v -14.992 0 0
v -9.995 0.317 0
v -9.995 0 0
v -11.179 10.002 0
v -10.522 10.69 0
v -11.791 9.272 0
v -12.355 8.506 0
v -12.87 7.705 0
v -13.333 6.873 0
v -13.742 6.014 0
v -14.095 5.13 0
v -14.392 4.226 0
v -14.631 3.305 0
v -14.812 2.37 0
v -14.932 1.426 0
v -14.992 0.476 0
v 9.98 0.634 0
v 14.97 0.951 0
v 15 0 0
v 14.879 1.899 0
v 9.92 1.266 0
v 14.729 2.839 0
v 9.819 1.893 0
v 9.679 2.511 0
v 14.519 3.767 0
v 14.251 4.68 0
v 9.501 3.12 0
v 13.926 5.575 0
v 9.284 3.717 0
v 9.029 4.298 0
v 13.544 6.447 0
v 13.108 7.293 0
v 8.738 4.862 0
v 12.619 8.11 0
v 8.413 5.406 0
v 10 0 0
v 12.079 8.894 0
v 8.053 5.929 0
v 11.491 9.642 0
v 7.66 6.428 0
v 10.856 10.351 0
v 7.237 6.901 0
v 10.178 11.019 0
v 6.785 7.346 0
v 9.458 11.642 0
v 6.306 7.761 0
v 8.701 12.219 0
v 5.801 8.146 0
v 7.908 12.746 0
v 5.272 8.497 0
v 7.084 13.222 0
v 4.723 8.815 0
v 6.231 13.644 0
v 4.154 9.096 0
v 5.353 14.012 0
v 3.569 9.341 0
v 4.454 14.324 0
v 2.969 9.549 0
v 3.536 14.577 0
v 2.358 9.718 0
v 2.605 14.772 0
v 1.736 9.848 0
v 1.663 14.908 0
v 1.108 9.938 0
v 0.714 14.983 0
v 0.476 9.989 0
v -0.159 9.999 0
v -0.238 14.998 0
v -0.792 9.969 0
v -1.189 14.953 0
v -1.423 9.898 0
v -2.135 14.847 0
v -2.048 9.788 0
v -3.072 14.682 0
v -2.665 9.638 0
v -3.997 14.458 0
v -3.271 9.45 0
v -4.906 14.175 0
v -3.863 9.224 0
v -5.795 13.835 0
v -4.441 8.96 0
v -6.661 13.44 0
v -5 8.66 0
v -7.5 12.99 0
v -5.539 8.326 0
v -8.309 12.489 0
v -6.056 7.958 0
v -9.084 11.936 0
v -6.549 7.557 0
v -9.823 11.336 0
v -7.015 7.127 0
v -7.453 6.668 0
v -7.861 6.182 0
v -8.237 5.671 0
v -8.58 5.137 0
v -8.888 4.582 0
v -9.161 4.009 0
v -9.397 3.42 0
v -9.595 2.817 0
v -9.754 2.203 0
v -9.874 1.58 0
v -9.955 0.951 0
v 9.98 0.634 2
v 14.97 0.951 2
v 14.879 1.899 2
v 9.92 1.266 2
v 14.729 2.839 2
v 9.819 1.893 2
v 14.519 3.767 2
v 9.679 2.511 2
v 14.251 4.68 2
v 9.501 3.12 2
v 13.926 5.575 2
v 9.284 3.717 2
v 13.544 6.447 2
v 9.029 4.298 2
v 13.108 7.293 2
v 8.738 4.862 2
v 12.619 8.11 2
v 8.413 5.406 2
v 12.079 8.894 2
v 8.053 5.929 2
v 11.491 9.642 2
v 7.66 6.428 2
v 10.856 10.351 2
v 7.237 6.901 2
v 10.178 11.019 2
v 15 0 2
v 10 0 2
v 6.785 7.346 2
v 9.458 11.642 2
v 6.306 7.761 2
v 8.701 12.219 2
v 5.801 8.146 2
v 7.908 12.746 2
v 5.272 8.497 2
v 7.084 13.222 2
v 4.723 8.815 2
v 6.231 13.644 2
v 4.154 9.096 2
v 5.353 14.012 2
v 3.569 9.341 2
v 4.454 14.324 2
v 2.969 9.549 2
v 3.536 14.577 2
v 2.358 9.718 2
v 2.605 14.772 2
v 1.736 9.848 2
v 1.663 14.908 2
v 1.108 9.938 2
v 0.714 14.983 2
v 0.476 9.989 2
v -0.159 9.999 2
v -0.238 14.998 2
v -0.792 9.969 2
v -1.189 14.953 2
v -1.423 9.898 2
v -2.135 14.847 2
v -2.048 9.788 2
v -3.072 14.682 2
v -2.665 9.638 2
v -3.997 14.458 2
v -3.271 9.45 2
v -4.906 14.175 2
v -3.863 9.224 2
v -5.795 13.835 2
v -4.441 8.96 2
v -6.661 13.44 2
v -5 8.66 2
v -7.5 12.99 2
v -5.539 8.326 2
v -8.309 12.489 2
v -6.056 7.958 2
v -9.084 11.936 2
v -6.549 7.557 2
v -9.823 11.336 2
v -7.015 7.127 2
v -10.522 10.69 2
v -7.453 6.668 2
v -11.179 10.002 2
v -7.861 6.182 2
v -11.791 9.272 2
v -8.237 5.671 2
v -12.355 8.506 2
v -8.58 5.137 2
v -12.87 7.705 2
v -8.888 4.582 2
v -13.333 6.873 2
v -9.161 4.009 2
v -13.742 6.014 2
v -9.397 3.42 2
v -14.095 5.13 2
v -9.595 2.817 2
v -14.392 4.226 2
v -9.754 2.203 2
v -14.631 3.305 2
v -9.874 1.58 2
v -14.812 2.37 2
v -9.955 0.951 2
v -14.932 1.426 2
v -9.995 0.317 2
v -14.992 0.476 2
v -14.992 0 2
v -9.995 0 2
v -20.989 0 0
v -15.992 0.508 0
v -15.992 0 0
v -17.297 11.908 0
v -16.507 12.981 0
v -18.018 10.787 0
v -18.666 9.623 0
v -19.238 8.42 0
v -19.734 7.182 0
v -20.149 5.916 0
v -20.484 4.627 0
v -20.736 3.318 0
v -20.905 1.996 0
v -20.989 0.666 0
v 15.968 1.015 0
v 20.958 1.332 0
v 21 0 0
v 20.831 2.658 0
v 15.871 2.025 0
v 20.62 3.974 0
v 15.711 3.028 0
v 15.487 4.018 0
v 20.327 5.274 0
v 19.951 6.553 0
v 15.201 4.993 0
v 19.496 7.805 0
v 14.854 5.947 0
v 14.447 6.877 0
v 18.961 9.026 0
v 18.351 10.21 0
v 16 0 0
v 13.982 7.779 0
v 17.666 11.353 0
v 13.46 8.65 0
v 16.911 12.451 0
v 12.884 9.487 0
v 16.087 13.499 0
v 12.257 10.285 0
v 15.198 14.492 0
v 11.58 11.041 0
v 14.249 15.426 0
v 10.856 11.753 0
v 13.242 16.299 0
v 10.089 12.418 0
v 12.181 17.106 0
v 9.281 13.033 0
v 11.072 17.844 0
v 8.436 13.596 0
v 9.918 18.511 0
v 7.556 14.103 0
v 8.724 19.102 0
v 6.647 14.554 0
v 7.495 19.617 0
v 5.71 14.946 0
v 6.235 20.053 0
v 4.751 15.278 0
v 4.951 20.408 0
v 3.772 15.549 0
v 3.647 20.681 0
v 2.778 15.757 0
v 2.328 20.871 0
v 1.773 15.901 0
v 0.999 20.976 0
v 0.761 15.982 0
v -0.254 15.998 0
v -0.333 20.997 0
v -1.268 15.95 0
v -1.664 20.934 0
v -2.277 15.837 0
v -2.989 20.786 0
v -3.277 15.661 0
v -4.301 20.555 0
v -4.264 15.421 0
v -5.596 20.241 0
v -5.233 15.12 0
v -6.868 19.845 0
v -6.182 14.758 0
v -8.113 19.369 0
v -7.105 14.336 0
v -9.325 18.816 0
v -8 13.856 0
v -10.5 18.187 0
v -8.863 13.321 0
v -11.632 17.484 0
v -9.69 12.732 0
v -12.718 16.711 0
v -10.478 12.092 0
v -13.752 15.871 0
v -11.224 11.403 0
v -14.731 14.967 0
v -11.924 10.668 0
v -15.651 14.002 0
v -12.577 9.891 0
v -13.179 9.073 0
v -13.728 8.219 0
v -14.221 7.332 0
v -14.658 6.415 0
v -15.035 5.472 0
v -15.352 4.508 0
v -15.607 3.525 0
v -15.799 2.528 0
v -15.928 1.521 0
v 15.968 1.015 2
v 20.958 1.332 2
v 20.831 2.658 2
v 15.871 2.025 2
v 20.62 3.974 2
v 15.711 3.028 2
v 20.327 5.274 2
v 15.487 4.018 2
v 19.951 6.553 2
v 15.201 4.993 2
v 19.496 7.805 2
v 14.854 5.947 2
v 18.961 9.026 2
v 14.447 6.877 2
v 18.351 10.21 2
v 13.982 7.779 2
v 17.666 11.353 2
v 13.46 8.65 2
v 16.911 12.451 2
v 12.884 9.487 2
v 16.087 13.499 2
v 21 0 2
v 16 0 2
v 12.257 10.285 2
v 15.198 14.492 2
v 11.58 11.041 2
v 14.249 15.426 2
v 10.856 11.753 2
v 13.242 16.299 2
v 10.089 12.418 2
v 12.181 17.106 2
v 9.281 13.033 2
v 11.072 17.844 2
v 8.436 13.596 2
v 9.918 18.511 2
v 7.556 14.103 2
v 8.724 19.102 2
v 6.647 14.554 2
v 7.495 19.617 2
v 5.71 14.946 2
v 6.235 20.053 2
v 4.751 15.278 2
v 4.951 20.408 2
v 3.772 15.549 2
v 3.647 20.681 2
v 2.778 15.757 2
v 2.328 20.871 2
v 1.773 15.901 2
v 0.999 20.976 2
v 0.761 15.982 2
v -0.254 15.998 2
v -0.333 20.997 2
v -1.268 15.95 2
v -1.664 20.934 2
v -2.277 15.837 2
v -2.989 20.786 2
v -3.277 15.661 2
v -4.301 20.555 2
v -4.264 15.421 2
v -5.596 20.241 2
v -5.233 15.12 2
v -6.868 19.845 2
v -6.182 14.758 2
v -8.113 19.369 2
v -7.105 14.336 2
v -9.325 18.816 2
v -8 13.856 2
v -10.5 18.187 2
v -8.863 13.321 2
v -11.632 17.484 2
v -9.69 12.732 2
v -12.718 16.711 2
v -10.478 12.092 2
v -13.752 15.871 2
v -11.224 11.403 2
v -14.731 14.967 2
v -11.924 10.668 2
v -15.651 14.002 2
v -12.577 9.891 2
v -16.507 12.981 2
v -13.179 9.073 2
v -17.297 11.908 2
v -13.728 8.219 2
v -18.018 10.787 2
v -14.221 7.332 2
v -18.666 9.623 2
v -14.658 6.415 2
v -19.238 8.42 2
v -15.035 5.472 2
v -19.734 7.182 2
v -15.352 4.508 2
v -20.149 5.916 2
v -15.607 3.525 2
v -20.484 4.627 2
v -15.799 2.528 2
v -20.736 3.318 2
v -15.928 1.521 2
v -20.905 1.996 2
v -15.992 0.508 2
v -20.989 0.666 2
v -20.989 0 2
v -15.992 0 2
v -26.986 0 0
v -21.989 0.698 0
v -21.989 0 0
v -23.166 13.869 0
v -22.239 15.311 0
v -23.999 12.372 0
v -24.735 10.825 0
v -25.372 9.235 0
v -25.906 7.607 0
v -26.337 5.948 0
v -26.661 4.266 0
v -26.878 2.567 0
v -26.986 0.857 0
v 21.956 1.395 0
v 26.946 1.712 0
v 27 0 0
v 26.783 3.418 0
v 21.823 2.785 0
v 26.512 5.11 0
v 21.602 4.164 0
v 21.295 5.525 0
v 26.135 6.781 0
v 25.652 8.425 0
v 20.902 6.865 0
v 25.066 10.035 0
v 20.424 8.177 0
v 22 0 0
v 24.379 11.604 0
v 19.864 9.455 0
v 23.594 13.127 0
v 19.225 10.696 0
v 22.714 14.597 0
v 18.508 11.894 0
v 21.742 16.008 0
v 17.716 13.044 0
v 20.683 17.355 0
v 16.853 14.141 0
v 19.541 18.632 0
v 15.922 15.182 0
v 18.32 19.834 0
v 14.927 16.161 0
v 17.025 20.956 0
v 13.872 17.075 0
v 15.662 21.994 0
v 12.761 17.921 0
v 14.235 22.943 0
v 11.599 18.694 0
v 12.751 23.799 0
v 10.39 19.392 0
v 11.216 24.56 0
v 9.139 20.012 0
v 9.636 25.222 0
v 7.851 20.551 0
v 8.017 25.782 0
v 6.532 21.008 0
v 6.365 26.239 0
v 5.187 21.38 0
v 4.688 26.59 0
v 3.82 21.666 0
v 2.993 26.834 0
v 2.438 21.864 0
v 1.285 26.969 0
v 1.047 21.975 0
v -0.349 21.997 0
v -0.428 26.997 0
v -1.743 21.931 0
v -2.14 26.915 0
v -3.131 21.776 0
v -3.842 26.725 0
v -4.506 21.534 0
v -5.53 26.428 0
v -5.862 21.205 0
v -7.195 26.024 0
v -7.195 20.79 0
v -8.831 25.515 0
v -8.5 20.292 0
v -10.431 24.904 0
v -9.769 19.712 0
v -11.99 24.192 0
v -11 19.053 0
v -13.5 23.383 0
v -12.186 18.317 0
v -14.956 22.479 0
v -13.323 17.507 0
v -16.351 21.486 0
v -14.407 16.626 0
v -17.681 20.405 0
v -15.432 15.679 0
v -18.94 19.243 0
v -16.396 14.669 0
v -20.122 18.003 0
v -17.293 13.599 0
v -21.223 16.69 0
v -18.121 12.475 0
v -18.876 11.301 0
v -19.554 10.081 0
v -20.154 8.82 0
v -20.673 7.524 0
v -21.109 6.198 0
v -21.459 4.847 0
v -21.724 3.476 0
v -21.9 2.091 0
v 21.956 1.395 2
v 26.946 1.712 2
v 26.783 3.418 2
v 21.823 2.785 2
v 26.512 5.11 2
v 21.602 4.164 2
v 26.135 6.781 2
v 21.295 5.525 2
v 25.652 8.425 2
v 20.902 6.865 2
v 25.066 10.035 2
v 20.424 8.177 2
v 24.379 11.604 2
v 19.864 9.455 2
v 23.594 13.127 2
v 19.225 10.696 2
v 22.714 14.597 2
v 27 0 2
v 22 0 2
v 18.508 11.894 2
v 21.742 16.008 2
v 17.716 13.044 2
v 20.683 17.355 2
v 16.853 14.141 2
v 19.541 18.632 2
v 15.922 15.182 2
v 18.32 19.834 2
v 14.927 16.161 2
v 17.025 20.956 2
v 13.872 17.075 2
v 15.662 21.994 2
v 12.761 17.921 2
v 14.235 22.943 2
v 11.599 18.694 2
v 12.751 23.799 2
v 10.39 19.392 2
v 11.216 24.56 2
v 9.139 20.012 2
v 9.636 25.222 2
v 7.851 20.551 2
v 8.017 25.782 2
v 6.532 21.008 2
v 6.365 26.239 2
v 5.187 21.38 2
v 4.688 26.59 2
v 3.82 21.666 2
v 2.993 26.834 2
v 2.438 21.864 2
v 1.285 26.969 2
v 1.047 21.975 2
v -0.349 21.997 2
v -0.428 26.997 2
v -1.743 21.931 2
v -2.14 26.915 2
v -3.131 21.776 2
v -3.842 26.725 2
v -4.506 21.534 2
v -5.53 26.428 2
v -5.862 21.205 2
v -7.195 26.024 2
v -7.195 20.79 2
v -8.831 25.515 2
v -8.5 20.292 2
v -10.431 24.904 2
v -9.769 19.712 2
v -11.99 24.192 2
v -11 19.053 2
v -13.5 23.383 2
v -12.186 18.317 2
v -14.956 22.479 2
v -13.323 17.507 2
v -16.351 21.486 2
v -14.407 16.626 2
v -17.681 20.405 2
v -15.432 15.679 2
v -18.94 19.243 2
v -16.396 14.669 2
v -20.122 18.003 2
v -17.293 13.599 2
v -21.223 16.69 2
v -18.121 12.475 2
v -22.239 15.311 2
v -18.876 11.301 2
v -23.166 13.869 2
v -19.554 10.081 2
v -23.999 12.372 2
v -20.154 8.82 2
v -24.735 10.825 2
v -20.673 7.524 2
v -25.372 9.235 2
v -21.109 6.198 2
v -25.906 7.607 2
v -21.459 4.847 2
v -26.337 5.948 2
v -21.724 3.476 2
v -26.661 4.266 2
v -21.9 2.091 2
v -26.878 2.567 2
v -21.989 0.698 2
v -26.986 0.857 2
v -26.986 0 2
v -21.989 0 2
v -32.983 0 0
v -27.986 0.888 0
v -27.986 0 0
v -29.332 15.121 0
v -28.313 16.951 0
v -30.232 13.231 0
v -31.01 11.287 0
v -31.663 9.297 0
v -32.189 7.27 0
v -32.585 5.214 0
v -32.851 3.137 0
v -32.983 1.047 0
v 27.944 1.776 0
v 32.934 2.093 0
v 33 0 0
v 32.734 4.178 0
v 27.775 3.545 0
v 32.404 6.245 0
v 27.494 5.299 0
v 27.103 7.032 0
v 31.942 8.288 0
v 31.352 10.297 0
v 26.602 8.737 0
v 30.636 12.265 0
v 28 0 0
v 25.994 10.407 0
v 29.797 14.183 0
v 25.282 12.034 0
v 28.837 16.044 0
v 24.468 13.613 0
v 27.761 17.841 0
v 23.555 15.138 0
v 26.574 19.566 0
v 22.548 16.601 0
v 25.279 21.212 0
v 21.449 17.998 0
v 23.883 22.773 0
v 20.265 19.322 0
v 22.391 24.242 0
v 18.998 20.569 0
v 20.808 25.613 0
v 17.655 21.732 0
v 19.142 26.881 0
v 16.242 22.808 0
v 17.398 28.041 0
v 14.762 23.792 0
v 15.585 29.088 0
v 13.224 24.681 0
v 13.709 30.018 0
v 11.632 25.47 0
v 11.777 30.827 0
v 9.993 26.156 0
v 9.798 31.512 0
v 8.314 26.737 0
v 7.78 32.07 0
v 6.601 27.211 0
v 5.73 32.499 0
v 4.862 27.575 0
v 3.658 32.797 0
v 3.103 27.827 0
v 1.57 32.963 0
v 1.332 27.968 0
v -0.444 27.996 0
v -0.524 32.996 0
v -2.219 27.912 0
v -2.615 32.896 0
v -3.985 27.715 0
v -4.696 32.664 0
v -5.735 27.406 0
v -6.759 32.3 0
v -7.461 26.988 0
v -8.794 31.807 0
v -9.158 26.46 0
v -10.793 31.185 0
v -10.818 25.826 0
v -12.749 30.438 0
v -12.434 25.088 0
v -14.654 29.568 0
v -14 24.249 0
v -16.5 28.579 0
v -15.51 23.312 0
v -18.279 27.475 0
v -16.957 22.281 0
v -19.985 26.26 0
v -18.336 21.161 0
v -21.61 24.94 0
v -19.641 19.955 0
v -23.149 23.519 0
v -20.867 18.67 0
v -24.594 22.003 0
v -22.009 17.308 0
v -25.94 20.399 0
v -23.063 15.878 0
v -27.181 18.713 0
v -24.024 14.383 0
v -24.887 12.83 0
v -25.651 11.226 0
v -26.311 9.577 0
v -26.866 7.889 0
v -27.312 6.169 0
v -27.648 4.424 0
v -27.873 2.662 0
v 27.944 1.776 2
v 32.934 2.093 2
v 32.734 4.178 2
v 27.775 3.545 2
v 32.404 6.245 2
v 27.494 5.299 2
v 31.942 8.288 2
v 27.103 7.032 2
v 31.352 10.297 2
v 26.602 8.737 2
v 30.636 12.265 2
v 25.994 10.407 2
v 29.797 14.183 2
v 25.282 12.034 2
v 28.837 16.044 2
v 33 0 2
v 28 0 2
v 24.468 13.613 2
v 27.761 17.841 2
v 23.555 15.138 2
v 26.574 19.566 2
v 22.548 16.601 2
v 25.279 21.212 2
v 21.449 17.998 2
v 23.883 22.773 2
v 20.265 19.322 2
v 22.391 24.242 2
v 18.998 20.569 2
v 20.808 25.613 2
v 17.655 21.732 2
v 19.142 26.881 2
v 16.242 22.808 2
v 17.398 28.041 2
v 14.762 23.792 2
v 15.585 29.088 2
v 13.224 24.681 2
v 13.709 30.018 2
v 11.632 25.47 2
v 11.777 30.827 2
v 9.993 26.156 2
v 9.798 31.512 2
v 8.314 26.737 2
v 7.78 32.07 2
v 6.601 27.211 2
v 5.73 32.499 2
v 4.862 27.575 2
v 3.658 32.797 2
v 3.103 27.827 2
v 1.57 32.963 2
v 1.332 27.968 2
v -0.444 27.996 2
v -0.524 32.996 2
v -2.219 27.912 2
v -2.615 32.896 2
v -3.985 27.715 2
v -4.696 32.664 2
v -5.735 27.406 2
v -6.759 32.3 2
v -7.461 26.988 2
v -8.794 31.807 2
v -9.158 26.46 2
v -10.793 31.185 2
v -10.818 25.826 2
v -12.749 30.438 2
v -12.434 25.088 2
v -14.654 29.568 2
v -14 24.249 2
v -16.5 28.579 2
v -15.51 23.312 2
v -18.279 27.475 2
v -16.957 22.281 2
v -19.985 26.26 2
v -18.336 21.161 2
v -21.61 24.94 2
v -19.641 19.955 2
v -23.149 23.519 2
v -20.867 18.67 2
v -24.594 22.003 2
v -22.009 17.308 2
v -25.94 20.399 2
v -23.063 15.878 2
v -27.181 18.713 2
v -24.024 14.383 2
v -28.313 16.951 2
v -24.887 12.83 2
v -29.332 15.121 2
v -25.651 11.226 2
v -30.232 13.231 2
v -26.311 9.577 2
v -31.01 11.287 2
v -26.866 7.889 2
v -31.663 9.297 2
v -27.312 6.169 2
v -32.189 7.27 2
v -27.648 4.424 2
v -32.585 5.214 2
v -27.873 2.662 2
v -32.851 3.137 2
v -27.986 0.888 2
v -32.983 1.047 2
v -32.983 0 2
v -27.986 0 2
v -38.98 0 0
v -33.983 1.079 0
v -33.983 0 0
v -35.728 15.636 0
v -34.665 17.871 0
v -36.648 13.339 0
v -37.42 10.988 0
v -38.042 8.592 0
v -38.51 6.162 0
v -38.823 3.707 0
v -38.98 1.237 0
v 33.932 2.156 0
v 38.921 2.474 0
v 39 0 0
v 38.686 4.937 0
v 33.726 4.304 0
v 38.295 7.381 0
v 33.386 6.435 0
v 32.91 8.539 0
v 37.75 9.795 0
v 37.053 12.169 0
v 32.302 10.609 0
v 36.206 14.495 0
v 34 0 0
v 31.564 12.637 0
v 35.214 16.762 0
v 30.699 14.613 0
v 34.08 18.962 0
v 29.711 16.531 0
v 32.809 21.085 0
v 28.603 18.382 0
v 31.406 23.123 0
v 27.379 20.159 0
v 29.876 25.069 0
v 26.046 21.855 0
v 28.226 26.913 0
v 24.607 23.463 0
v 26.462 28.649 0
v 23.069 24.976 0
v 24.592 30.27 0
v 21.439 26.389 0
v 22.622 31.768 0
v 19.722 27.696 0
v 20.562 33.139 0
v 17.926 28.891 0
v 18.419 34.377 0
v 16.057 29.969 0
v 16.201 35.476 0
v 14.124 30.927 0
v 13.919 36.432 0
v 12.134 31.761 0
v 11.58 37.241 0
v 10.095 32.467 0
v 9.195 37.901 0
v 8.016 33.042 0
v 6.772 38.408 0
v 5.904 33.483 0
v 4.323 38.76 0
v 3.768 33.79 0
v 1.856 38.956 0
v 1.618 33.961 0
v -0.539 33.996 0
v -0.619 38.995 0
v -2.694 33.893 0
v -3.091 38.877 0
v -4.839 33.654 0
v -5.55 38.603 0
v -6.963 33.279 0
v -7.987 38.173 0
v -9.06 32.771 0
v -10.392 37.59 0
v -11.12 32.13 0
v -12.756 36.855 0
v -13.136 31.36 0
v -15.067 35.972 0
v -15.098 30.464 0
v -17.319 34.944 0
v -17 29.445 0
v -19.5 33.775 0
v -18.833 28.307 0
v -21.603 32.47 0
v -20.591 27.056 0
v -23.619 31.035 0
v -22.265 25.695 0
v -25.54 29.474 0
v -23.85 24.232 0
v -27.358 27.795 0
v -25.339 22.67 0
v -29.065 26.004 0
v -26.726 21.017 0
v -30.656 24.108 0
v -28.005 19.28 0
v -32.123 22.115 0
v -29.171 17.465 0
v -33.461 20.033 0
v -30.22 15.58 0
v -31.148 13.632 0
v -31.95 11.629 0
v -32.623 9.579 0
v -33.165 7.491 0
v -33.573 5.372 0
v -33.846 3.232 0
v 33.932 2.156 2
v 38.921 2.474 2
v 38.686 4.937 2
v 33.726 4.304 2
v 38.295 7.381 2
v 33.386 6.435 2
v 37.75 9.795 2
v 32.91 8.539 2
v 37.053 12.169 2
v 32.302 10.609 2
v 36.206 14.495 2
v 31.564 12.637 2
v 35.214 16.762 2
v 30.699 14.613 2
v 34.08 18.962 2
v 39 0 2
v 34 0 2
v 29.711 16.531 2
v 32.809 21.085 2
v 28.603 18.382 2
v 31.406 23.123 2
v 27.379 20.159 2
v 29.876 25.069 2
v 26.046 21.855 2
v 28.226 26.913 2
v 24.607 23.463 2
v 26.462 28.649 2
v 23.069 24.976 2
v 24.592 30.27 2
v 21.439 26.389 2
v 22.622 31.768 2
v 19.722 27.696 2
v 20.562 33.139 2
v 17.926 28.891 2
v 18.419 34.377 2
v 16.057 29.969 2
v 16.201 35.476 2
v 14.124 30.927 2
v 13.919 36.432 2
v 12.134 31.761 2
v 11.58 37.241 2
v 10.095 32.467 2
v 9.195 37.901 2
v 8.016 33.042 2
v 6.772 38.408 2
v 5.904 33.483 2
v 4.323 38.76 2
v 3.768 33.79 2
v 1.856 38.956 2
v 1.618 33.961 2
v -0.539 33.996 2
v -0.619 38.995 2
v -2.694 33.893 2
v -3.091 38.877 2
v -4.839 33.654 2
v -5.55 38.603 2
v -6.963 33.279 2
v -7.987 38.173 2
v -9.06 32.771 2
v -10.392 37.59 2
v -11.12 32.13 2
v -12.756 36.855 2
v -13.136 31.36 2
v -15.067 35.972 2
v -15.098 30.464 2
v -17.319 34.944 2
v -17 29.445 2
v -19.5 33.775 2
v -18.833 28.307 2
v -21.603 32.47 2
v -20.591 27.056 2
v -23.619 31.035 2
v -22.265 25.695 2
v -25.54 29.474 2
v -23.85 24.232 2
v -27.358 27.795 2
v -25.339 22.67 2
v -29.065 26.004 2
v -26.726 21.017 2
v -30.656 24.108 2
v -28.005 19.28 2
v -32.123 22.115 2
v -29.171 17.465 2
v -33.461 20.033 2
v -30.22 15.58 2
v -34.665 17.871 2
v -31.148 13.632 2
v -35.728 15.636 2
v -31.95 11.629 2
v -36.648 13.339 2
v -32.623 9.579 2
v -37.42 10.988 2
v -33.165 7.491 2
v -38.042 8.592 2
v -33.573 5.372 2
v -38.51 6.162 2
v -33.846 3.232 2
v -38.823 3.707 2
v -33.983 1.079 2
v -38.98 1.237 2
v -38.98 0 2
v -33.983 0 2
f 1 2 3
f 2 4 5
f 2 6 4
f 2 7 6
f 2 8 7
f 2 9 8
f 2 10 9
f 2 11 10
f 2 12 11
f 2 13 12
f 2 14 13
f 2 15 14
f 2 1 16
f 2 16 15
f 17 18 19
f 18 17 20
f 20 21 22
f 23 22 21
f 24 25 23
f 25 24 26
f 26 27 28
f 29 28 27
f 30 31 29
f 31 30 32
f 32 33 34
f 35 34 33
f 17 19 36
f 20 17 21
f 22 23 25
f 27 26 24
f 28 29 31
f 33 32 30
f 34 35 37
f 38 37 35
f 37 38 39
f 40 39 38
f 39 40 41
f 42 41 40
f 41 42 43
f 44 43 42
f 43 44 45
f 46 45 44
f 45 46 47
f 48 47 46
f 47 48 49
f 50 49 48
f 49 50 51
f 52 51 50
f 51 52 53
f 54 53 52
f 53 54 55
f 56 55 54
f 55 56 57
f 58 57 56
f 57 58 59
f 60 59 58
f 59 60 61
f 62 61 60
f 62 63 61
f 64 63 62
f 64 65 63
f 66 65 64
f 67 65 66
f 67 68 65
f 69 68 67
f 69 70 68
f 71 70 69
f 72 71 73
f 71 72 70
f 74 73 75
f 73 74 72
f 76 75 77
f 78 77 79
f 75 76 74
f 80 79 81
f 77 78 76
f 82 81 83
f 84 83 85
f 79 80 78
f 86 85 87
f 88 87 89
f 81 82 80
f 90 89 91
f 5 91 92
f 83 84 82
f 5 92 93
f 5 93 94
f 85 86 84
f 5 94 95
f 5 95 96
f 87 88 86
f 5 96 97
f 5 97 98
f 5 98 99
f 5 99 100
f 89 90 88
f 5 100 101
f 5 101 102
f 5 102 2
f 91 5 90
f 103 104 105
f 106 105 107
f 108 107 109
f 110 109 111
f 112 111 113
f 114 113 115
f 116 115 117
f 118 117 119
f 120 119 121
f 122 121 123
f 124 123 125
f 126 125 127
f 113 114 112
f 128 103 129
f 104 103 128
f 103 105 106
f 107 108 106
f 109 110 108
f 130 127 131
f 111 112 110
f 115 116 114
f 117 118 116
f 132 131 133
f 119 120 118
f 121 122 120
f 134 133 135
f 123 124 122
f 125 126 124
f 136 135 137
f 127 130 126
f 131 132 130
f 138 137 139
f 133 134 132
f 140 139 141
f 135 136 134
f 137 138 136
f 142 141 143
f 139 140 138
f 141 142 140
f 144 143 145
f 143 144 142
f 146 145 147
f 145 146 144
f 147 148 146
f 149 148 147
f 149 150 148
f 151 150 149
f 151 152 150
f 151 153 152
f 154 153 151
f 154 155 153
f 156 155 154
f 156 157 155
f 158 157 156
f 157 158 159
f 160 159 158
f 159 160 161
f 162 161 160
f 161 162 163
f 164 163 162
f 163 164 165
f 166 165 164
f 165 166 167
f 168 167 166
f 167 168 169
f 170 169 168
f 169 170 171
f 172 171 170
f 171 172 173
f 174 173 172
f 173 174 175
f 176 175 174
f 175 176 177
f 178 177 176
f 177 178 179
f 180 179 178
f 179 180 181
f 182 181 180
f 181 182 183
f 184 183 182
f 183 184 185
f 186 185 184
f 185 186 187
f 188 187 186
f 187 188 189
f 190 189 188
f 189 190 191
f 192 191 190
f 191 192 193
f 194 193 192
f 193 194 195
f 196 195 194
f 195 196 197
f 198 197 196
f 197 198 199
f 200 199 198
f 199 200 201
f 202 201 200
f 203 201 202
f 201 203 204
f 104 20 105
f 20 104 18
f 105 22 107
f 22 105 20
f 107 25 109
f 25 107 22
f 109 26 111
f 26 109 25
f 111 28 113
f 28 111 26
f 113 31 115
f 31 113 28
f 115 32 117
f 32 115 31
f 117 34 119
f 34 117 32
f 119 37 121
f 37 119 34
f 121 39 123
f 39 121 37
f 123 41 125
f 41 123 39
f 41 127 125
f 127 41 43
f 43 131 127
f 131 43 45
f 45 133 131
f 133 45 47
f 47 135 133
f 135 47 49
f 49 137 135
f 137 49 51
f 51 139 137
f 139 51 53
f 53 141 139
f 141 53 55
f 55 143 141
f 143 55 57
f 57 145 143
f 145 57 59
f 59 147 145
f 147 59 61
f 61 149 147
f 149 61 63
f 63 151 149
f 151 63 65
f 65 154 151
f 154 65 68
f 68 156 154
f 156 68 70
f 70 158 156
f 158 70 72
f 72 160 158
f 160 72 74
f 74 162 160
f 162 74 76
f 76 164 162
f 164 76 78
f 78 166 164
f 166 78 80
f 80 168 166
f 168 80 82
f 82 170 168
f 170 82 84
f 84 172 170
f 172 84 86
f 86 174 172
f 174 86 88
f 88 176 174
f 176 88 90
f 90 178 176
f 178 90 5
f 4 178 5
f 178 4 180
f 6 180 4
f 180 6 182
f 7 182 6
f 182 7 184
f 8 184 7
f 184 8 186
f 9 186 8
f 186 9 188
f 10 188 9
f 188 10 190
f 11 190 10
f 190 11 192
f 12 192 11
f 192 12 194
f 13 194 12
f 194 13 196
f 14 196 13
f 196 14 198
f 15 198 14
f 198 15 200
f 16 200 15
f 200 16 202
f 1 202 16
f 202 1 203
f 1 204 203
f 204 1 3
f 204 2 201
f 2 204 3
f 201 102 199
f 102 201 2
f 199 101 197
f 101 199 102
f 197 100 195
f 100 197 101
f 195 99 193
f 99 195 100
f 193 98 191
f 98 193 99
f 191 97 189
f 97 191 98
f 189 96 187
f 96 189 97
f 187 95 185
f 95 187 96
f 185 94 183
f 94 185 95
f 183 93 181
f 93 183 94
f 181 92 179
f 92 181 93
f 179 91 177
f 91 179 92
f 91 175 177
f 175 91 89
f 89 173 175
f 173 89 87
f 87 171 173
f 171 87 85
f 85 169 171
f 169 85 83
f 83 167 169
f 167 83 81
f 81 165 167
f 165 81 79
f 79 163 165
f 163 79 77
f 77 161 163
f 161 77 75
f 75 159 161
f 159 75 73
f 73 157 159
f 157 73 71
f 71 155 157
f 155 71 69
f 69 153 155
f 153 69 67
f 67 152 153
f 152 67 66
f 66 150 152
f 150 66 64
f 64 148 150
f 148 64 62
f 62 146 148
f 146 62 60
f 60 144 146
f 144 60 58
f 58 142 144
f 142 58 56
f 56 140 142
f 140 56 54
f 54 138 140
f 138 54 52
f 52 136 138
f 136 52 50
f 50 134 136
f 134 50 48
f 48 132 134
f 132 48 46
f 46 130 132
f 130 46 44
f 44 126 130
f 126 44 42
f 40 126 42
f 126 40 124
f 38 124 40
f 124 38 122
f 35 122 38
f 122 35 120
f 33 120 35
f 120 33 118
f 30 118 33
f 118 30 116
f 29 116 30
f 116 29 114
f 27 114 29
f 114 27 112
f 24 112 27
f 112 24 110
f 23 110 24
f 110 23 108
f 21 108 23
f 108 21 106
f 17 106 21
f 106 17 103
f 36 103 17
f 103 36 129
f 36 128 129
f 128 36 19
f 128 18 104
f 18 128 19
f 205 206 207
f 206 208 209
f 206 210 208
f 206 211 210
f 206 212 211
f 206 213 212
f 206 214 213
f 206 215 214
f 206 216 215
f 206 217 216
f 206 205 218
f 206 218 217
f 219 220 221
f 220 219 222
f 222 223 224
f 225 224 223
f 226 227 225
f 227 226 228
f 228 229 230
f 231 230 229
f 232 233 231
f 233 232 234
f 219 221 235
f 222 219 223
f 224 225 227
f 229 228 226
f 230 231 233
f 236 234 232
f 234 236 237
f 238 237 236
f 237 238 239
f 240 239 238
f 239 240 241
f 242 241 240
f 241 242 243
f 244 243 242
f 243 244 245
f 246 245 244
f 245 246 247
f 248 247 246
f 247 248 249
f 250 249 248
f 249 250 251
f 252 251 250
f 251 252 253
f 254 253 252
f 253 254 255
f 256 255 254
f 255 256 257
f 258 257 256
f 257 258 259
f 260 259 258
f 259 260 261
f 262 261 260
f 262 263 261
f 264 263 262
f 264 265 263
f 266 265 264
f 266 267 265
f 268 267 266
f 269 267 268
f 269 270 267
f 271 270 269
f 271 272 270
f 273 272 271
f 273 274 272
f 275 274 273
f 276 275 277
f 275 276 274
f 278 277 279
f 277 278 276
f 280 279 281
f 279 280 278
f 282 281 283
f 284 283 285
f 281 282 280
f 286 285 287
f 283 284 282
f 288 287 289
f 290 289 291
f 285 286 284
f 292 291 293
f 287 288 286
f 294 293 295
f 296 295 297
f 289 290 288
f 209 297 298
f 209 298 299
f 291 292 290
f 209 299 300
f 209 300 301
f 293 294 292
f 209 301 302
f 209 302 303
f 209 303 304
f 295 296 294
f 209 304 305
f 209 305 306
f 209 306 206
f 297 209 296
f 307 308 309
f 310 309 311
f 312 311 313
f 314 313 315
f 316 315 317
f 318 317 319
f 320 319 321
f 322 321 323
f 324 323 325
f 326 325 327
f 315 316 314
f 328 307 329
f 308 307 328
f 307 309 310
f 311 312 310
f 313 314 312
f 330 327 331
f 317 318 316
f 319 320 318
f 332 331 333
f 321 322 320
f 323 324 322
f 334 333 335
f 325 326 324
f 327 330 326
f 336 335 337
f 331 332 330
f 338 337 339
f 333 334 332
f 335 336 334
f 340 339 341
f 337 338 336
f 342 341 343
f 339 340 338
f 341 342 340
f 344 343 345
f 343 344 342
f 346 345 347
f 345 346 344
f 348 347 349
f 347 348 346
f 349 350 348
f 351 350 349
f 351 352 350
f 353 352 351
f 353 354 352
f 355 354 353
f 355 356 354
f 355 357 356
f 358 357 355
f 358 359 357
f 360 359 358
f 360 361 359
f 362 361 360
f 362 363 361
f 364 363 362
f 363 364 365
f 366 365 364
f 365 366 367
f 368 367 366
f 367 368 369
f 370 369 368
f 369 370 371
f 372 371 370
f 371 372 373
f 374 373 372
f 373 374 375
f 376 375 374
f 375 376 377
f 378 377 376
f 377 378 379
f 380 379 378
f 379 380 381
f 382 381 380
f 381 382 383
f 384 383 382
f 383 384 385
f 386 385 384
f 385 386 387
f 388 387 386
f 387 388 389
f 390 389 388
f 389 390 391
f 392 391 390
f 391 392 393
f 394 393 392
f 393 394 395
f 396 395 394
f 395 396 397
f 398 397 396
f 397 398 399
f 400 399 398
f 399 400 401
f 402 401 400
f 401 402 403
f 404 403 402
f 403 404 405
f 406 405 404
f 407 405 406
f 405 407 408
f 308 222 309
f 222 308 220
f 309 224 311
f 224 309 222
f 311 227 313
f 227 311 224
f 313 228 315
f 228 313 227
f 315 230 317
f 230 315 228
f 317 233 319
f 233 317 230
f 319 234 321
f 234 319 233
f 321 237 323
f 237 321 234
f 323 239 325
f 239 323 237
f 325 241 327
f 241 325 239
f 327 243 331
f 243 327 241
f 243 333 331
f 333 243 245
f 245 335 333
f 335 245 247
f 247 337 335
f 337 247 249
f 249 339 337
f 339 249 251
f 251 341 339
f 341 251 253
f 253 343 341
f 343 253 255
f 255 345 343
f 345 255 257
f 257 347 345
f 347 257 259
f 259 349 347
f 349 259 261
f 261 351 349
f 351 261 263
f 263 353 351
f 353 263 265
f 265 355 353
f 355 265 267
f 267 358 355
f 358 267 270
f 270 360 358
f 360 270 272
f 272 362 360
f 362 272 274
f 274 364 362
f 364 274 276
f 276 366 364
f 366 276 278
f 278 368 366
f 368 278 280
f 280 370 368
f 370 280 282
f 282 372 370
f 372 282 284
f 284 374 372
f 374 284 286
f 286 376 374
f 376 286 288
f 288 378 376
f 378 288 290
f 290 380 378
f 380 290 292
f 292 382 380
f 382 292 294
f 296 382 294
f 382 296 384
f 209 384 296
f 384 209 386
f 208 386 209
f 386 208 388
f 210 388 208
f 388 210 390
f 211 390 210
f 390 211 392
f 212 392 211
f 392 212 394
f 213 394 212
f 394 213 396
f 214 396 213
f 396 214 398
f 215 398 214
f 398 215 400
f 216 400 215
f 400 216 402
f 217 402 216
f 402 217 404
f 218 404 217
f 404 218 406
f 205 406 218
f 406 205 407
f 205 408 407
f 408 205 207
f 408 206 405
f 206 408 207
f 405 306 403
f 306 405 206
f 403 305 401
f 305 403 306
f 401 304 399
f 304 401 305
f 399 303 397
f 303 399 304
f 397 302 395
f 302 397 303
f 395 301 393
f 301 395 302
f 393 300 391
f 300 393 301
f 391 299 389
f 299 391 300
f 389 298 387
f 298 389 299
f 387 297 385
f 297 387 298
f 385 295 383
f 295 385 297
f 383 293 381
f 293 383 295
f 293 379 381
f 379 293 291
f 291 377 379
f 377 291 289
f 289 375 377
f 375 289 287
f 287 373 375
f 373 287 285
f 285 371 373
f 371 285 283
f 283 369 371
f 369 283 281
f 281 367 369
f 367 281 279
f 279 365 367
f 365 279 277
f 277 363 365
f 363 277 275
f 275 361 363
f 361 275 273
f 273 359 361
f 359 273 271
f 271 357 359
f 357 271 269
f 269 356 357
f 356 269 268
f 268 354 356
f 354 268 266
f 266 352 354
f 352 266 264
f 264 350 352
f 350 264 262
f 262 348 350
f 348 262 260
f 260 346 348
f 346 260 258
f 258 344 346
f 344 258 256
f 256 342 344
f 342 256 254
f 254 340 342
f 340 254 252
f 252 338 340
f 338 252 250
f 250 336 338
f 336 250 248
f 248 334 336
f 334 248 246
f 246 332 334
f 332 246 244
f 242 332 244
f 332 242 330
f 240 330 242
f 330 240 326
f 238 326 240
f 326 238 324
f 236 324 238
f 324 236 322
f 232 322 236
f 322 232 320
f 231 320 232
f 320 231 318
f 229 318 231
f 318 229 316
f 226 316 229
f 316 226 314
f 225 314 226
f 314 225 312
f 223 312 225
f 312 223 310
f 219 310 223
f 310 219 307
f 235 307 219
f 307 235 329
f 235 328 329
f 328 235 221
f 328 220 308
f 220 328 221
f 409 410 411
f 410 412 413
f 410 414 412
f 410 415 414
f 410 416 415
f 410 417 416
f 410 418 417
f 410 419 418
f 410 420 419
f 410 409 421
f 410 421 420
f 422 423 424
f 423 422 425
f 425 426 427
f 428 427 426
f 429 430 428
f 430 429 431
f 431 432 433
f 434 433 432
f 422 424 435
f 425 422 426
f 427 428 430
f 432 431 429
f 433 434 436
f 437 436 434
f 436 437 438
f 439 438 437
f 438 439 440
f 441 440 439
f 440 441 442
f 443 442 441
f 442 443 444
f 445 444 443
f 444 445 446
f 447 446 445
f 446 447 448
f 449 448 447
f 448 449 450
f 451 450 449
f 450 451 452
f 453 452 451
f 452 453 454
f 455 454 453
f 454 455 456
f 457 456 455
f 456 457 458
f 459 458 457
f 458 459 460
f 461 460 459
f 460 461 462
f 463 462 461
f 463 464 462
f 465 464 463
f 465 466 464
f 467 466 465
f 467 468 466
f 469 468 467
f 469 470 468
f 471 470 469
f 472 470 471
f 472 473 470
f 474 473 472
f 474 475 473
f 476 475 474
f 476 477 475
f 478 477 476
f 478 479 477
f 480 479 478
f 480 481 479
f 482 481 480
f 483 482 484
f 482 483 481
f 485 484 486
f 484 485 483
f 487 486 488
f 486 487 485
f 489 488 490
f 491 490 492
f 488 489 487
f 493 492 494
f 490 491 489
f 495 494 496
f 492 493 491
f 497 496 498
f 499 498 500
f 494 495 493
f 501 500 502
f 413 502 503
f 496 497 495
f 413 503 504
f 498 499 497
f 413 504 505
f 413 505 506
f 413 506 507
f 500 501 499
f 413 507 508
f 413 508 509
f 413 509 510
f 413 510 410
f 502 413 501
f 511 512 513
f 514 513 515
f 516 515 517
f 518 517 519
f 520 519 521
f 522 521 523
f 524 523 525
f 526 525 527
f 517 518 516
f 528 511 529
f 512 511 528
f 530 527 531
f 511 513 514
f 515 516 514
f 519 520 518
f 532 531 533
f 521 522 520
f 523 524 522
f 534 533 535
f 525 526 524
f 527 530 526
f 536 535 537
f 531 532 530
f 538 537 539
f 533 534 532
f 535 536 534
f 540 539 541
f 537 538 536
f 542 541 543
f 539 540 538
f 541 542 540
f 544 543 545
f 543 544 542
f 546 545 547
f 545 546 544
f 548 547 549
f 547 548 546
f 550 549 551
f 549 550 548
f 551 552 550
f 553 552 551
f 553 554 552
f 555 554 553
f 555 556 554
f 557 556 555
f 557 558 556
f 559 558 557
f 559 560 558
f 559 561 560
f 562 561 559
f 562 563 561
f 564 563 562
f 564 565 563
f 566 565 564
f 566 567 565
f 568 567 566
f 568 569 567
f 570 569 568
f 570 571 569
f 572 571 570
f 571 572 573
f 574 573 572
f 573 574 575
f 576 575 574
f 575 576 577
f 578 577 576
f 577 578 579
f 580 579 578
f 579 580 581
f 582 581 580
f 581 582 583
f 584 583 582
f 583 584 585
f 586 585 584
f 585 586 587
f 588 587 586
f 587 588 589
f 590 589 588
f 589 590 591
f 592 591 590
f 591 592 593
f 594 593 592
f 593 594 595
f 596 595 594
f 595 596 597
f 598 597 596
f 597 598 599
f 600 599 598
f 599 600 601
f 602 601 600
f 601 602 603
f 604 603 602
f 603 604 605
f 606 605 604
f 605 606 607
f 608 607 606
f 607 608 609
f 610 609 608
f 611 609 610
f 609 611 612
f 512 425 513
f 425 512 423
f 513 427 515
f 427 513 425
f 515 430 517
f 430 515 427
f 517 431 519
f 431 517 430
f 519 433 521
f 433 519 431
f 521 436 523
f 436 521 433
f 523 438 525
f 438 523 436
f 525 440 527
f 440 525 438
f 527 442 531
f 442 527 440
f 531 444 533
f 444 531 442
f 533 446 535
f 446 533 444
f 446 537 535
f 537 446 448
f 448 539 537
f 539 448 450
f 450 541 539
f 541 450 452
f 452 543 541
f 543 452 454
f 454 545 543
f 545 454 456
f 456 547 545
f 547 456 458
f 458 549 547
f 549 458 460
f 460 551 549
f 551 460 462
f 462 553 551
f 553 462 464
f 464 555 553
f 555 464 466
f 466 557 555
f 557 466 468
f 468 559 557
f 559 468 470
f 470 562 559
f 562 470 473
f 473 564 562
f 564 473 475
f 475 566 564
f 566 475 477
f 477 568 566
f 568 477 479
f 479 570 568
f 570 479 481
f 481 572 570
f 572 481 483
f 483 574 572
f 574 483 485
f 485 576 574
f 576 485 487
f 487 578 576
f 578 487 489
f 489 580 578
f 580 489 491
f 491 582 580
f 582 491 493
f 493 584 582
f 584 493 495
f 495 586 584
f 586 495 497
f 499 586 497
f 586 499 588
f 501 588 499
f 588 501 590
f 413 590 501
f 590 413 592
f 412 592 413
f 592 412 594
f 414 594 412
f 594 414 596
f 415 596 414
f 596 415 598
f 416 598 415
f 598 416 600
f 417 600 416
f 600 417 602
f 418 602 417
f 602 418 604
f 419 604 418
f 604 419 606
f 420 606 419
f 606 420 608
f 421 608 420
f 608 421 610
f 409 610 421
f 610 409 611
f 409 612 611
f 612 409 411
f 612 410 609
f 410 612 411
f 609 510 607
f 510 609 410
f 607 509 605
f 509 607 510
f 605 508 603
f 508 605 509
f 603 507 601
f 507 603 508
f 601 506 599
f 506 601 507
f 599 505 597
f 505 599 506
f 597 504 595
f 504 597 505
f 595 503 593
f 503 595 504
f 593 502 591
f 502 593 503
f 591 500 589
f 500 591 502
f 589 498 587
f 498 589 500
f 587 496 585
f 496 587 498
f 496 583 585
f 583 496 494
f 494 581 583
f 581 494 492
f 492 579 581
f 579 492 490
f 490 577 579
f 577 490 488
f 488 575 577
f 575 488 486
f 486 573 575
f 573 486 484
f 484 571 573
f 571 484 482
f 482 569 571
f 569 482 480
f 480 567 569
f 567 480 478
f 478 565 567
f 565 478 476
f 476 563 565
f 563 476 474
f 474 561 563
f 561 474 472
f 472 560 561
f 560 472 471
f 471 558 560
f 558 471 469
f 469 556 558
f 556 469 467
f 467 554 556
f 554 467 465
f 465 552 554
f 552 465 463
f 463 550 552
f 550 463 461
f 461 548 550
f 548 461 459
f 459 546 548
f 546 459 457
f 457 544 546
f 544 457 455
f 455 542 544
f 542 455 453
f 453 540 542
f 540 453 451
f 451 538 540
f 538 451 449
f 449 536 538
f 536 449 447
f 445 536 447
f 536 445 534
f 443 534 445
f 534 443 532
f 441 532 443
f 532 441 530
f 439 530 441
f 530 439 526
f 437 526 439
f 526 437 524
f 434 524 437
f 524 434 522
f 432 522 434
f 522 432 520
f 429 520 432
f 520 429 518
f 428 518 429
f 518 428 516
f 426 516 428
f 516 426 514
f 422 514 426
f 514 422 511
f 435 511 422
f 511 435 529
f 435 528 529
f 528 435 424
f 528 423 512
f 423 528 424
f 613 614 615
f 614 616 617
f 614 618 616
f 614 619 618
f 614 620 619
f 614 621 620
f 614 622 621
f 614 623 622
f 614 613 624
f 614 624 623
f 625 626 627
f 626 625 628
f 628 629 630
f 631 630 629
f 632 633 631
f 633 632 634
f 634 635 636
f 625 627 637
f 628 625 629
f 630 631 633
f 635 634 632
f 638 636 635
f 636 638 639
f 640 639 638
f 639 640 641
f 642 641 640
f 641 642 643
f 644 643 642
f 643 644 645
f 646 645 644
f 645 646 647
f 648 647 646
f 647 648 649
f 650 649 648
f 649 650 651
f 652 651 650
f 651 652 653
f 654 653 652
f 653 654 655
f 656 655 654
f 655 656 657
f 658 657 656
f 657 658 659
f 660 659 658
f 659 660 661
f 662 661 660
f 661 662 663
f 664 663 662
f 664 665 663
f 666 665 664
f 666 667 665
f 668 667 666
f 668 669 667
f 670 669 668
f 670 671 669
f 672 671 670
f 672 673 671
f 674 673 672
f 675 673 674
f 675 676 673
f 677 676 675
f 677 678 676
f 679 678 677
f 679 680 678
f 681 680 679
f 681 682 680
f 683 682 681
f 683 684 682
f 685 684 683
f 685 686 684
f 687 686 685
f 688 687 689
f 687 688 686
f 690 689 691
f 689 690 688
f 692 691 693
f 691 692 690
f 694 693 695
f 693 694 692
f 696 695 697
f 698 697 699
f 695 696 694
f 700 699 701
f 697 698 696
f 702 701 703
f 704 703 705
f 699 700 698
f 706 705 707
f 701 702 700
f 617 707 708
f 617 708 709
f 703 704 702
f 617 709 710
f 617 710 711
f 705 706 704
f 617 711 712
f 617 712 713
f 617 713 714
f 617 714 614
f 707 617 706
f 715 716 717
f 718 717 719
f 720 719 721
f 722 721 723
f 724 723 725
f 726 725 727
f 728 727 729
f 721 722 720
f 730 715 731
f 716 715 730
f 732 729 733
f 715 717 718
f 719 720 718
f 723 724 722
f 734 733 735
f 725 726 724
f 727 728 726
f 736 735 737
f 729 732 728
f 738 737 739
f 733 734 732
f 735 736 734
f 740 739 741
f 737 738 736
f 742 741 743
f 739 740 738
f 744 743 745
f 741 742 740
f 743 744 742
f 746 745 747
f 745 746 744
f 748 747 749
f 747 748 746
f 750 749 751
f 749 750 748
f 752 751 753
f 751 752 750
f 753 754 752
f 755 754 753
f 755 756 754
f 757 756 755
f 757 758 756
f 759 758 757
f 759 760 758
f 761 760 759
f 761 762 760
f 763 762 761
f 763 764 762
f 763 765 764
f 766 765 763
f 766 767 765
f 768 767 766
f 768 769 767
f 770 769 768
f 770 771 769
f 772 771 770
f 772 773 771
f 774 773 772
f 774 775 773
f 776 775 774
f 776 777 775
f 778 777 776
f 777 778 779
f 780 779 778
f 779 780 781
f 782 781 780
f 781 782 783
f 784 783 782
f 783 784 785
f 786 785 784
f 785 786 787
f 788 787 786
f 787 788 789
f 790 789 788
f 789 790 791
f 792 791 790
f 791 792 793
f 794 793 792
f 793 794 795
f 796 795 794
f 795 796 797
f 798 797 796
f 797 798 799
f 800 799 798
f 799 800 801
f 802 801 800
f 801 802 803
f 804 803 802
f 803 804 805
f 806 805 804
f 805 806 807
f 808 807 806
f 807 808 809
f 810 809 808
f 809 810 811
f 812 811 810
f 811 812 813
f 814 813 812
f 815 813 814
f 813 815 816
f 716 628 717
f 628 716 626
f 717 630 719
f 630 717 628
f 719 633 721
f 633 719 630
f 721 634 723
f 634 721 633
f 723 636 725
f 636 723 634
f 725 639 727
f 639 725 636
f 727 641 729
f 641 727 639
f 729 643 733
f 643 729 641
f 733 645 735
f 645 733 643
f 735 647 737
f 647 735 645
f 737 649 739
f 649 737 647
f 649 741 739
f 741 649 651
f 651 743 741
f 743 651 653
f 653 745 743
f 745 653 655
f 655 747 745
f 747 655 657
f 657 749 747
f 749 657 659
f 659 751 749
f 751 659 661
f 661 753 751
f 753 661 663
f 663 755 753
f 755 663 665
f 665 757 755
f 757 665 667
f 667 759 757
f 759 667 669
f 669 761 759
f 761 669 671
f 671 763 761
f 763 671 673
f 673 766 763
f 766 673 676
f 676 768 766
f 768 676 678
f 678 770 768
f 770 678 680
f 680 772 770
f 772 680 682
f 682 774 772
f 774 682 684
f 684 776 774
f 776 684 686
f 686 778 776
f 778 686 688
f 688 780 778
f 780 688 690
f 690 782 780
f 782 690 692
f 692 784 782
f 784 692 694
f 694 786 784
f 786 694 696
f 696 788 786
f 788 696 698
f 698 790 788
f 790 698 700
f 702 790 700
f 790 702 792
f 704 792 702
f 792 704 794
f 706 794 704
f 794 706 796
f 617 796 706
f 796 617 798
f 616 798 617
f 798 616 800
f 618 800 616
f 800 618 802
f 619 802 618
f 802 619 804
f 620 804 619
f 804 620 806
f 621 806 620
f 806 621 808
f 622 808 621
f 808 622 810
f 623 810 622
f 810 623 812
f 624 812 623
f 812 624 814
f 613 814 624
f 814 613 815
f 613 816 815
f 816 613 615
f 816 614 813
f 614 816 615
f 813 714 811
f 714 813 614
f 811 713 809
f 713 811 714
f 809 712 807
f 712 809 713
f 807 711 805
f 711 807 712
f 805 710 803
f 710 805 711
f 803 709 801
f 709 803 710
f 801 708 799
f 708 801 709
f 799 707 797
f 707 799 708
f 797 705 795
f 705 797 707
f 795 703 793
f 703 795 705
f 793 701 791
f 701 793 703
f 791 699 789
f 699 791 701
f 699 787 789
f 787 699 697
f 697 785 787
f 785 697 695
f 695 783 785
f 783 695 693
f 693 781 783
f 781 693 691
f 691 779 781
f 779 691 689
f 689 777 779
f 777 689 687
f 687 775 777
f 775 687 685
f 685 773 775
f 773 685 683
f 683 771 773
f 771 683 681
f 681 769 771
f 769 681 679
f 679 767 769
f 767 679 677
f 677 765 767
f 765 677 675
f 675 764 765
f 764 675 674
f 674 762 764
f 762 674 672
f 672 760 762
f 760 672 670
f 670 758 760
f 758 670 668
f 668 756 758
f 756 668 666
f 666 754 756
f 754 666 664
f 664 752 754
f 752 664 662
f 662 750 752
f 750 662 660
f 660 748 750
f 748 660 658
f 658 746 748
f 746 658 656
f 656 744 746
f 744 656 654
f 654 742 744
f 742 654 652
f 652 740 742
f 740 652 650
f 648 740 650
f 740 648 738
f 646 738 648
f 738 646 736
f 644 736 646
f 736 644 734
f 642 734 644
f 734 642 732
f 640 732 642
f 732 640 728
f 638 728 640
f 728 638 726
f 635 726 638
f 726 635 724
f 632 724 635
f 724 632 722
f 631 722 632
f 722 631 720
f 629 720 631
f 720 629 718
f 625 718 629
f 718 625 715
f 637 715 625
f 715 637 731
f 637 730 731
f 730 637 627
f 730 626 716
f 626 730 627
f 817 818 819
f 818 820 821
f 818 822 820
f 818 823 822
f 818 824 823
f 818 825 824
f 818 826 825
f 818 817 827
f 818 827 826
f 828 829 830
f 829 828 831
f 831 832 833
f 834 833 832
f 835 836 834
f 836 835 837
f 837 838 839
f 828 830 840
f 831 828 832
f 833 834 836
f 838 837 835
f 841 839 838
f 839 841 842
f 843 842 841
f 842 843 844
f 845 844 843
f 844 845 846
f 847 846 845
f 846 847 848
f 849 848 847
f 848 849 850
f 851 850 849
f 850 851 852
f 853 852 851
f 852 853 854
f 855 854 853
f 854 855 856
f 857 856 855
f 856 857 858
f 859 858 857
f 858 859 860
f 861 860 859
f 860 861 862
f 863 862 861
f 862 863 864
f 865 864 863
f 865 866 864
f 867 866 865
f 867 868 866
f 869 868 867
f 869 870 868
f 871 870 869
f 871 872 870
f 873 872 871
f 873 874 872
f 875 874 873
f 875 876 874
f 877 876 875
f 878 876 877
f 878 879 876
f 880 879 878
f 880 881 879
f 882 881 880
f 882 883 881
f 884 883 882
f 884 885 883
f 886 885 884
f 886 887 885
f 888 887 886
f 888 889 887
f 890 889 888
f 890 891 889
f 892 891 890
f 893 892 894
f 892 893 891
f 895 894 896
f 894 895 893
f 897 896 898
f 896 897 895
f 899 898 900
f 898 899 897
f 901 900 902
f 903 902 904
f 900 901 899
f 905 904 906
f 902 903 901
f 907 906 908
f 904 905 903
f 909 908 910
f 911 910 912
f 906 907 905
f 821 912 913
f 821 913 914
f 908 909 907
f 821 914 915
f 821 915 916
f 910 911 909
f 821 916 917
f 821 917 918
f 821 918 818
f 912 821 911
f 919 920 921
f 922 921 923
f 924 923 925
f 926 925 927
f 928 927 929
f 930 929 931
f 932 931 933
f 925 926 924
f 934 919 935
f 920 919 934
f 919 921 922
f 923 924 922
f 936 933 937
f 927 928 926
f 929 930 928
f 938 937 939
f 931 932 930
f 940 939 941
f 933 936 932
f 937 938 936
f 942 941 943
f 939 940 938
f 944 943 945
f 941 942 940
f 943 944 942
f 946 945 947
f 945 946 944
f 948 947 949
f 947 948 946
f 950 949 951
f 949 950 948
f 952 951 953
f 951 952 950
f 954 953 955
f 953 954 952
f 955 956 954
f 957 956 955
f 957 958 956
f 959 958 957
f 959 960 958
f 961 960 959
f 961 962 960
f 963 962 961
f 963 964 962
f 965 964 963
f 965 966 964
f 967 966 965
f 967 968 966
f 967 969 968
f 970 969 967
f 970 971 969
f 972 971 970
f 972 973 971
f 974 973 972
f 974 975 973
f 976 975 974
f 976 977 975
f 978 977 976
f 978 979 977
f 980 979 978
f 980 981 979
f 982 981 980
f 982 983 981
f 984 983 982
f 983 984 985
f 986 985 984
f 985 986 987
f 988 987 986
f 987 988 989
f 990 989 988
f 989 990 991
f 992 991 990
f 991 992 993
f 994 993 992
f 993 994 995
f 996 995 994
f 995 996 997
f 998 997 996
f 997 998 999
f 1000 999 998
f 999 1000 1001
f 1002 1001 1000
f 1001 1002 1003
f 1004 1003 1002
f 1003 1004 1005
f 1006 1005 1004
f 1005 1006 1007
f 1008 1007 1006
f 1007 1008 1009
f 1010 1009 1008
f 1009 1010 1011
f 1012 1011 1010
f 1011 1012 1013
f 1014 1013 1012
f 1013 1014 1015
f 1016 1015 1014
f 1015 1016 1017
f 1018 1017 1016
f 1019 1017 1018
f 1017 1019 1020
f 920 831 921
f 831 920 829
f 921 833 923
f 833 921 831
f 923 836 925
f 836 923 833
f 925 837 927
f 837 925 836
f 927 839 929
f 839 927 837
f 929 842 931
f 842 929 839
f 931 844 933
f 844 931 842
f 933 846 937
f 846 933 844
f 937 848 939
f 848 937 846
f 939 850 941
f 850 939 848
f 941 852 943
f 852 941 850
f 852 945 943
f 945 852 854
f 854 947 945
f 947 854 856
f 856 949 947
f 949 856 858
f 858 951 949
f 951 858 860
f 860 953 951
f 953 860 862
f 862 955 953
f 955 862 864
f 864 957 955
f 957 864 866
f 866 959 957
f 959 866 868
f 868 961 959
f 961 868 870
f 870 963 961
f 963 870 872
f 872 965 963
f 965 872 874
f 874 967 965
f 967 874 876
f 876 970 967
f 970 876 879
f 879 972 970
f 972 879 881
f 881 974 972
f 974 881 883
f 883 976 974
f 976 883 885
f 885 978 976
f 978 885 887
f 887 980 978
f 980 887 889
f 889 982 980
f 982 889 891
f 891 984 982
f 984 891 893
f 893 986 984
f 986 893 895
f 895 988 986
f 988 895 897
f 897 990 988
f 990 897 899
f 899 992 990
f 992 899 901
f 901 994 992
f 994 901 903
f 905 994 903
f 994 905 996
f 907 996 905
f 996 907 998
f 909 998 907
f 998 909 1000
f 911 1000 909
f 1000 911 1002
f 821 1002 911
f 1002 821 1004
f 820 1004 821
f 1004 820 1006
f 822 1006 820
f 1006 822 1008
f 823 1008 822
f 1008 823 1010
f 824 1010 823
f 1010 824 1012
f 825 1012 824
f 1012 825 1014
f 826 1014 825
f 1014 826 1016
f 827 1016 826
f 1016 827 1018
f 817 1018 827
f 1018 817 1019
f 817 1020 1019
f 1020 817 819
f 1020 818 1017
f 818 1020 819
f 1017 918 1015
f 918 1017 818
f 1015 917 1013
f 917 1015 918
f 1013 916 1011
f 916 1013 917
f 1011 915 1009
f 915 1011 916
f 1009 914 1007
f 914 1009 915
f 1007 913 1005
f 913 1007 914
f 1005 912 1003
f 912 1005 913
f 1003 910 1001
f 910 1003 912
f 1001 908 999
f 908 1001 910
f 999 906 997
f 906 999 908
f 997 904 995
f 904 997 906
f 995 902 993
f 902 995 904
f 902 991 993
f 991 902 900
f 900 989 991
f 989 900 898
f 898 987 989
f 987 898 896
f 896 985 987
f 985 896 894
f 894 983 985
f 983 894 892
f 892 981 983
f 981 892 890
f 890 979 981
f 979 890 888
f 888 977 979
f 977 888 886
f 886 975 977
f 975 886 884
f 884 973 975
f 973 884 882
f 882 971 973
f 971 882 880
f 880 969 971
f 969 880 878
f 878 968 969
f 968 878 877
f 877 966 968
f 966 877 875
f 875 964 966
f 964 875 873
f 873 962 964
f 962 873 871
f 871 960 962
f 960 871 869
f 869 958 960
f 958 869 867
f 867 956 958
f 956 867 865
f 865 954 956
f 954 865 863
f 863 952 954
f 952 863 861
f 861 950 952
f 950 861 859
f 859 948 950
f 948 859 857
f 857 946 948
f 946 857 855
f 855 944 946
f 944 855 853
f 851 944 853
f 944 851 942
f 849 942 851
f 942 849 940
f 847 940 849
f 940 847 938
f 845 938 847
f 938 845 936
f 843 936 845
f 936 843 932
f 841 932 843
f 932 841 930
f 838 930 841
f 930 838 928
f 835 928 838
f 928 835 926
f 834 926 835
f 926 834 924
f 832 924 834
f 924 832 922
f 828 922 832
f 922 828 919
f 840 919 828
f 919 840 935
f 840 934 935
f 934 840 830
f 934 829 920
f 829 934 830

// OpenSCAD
// arcs.scad - various kinds of arcs


/* [Arcs] */

// [Arc Count]
_ArcCount = 5;

// [Arc Width]
_ArcWidth = 5.0;

// [Arc Gap]
_ArcGap = 1.0;

// [Arc Start Radius]
_ArcStartRadius = 10.0;

// [Arc Thickness]
_ArcThickness = 2.0;

// [Arc Start Angle]
_ArcStartAngle = 0.0;

// [Arc End Angle]
_ArcEndAngle = 180.0;

// Arc
module Arc(InnerRadius, OuterRadius, StartAngle, EndAngle, Thickness)
{
    linear_extrude(Thickness)
    {
        H = sqrt(OuterRadius*OuterRadius + OuterRadius * OuterRadius);

        Cone =
        [
            [0, 0],
            for (Theta = [StartAngle : 1 : EndAngle]) [H * cos(Theta), H * sin(Theta)]
        ];
                 
        intersection()
        {
            difference()
            {
                circle(r=OuterRadius, $fn=99);
                circle(r=InnerRadius, $fn=99);
            }
            
            polygon(Cone);
        }
    }
}

module Arcs(ArcCount, ArcWidth, ArcGap, ArcStartRadius, ArcThickness, ArcStartAngle, ArcEndAngle)
{
    for (A = [0 : ArcCount - 1])
    {
        StartRadius = ArcStartRadius + (A *(ArcWidth + ArcGap));
        EndRadius   = StartRadius + ArcWidth;
        
        Arc(StartRadius, EndRadius, ArcStartAngle, ArcEndAngle, ArcThickness);
    }
}

module main(ArcCount, ArcWidth, ArcGap, ArcStartRadius, ArcThickness, ArcStartAngle, ArcEndAngle)
{
    Arcs(ArcCount, ArcWidth, ArcGap, ArcStartRadius, ArcThickness, ArcStartAngle, ArcEndAngle);
}

main(_ArcCount, _ArcWidth, _ArcGap, _ArcStartRadius, _ArcThickness, _ArcStartAngle, _ArcEndAngle);
